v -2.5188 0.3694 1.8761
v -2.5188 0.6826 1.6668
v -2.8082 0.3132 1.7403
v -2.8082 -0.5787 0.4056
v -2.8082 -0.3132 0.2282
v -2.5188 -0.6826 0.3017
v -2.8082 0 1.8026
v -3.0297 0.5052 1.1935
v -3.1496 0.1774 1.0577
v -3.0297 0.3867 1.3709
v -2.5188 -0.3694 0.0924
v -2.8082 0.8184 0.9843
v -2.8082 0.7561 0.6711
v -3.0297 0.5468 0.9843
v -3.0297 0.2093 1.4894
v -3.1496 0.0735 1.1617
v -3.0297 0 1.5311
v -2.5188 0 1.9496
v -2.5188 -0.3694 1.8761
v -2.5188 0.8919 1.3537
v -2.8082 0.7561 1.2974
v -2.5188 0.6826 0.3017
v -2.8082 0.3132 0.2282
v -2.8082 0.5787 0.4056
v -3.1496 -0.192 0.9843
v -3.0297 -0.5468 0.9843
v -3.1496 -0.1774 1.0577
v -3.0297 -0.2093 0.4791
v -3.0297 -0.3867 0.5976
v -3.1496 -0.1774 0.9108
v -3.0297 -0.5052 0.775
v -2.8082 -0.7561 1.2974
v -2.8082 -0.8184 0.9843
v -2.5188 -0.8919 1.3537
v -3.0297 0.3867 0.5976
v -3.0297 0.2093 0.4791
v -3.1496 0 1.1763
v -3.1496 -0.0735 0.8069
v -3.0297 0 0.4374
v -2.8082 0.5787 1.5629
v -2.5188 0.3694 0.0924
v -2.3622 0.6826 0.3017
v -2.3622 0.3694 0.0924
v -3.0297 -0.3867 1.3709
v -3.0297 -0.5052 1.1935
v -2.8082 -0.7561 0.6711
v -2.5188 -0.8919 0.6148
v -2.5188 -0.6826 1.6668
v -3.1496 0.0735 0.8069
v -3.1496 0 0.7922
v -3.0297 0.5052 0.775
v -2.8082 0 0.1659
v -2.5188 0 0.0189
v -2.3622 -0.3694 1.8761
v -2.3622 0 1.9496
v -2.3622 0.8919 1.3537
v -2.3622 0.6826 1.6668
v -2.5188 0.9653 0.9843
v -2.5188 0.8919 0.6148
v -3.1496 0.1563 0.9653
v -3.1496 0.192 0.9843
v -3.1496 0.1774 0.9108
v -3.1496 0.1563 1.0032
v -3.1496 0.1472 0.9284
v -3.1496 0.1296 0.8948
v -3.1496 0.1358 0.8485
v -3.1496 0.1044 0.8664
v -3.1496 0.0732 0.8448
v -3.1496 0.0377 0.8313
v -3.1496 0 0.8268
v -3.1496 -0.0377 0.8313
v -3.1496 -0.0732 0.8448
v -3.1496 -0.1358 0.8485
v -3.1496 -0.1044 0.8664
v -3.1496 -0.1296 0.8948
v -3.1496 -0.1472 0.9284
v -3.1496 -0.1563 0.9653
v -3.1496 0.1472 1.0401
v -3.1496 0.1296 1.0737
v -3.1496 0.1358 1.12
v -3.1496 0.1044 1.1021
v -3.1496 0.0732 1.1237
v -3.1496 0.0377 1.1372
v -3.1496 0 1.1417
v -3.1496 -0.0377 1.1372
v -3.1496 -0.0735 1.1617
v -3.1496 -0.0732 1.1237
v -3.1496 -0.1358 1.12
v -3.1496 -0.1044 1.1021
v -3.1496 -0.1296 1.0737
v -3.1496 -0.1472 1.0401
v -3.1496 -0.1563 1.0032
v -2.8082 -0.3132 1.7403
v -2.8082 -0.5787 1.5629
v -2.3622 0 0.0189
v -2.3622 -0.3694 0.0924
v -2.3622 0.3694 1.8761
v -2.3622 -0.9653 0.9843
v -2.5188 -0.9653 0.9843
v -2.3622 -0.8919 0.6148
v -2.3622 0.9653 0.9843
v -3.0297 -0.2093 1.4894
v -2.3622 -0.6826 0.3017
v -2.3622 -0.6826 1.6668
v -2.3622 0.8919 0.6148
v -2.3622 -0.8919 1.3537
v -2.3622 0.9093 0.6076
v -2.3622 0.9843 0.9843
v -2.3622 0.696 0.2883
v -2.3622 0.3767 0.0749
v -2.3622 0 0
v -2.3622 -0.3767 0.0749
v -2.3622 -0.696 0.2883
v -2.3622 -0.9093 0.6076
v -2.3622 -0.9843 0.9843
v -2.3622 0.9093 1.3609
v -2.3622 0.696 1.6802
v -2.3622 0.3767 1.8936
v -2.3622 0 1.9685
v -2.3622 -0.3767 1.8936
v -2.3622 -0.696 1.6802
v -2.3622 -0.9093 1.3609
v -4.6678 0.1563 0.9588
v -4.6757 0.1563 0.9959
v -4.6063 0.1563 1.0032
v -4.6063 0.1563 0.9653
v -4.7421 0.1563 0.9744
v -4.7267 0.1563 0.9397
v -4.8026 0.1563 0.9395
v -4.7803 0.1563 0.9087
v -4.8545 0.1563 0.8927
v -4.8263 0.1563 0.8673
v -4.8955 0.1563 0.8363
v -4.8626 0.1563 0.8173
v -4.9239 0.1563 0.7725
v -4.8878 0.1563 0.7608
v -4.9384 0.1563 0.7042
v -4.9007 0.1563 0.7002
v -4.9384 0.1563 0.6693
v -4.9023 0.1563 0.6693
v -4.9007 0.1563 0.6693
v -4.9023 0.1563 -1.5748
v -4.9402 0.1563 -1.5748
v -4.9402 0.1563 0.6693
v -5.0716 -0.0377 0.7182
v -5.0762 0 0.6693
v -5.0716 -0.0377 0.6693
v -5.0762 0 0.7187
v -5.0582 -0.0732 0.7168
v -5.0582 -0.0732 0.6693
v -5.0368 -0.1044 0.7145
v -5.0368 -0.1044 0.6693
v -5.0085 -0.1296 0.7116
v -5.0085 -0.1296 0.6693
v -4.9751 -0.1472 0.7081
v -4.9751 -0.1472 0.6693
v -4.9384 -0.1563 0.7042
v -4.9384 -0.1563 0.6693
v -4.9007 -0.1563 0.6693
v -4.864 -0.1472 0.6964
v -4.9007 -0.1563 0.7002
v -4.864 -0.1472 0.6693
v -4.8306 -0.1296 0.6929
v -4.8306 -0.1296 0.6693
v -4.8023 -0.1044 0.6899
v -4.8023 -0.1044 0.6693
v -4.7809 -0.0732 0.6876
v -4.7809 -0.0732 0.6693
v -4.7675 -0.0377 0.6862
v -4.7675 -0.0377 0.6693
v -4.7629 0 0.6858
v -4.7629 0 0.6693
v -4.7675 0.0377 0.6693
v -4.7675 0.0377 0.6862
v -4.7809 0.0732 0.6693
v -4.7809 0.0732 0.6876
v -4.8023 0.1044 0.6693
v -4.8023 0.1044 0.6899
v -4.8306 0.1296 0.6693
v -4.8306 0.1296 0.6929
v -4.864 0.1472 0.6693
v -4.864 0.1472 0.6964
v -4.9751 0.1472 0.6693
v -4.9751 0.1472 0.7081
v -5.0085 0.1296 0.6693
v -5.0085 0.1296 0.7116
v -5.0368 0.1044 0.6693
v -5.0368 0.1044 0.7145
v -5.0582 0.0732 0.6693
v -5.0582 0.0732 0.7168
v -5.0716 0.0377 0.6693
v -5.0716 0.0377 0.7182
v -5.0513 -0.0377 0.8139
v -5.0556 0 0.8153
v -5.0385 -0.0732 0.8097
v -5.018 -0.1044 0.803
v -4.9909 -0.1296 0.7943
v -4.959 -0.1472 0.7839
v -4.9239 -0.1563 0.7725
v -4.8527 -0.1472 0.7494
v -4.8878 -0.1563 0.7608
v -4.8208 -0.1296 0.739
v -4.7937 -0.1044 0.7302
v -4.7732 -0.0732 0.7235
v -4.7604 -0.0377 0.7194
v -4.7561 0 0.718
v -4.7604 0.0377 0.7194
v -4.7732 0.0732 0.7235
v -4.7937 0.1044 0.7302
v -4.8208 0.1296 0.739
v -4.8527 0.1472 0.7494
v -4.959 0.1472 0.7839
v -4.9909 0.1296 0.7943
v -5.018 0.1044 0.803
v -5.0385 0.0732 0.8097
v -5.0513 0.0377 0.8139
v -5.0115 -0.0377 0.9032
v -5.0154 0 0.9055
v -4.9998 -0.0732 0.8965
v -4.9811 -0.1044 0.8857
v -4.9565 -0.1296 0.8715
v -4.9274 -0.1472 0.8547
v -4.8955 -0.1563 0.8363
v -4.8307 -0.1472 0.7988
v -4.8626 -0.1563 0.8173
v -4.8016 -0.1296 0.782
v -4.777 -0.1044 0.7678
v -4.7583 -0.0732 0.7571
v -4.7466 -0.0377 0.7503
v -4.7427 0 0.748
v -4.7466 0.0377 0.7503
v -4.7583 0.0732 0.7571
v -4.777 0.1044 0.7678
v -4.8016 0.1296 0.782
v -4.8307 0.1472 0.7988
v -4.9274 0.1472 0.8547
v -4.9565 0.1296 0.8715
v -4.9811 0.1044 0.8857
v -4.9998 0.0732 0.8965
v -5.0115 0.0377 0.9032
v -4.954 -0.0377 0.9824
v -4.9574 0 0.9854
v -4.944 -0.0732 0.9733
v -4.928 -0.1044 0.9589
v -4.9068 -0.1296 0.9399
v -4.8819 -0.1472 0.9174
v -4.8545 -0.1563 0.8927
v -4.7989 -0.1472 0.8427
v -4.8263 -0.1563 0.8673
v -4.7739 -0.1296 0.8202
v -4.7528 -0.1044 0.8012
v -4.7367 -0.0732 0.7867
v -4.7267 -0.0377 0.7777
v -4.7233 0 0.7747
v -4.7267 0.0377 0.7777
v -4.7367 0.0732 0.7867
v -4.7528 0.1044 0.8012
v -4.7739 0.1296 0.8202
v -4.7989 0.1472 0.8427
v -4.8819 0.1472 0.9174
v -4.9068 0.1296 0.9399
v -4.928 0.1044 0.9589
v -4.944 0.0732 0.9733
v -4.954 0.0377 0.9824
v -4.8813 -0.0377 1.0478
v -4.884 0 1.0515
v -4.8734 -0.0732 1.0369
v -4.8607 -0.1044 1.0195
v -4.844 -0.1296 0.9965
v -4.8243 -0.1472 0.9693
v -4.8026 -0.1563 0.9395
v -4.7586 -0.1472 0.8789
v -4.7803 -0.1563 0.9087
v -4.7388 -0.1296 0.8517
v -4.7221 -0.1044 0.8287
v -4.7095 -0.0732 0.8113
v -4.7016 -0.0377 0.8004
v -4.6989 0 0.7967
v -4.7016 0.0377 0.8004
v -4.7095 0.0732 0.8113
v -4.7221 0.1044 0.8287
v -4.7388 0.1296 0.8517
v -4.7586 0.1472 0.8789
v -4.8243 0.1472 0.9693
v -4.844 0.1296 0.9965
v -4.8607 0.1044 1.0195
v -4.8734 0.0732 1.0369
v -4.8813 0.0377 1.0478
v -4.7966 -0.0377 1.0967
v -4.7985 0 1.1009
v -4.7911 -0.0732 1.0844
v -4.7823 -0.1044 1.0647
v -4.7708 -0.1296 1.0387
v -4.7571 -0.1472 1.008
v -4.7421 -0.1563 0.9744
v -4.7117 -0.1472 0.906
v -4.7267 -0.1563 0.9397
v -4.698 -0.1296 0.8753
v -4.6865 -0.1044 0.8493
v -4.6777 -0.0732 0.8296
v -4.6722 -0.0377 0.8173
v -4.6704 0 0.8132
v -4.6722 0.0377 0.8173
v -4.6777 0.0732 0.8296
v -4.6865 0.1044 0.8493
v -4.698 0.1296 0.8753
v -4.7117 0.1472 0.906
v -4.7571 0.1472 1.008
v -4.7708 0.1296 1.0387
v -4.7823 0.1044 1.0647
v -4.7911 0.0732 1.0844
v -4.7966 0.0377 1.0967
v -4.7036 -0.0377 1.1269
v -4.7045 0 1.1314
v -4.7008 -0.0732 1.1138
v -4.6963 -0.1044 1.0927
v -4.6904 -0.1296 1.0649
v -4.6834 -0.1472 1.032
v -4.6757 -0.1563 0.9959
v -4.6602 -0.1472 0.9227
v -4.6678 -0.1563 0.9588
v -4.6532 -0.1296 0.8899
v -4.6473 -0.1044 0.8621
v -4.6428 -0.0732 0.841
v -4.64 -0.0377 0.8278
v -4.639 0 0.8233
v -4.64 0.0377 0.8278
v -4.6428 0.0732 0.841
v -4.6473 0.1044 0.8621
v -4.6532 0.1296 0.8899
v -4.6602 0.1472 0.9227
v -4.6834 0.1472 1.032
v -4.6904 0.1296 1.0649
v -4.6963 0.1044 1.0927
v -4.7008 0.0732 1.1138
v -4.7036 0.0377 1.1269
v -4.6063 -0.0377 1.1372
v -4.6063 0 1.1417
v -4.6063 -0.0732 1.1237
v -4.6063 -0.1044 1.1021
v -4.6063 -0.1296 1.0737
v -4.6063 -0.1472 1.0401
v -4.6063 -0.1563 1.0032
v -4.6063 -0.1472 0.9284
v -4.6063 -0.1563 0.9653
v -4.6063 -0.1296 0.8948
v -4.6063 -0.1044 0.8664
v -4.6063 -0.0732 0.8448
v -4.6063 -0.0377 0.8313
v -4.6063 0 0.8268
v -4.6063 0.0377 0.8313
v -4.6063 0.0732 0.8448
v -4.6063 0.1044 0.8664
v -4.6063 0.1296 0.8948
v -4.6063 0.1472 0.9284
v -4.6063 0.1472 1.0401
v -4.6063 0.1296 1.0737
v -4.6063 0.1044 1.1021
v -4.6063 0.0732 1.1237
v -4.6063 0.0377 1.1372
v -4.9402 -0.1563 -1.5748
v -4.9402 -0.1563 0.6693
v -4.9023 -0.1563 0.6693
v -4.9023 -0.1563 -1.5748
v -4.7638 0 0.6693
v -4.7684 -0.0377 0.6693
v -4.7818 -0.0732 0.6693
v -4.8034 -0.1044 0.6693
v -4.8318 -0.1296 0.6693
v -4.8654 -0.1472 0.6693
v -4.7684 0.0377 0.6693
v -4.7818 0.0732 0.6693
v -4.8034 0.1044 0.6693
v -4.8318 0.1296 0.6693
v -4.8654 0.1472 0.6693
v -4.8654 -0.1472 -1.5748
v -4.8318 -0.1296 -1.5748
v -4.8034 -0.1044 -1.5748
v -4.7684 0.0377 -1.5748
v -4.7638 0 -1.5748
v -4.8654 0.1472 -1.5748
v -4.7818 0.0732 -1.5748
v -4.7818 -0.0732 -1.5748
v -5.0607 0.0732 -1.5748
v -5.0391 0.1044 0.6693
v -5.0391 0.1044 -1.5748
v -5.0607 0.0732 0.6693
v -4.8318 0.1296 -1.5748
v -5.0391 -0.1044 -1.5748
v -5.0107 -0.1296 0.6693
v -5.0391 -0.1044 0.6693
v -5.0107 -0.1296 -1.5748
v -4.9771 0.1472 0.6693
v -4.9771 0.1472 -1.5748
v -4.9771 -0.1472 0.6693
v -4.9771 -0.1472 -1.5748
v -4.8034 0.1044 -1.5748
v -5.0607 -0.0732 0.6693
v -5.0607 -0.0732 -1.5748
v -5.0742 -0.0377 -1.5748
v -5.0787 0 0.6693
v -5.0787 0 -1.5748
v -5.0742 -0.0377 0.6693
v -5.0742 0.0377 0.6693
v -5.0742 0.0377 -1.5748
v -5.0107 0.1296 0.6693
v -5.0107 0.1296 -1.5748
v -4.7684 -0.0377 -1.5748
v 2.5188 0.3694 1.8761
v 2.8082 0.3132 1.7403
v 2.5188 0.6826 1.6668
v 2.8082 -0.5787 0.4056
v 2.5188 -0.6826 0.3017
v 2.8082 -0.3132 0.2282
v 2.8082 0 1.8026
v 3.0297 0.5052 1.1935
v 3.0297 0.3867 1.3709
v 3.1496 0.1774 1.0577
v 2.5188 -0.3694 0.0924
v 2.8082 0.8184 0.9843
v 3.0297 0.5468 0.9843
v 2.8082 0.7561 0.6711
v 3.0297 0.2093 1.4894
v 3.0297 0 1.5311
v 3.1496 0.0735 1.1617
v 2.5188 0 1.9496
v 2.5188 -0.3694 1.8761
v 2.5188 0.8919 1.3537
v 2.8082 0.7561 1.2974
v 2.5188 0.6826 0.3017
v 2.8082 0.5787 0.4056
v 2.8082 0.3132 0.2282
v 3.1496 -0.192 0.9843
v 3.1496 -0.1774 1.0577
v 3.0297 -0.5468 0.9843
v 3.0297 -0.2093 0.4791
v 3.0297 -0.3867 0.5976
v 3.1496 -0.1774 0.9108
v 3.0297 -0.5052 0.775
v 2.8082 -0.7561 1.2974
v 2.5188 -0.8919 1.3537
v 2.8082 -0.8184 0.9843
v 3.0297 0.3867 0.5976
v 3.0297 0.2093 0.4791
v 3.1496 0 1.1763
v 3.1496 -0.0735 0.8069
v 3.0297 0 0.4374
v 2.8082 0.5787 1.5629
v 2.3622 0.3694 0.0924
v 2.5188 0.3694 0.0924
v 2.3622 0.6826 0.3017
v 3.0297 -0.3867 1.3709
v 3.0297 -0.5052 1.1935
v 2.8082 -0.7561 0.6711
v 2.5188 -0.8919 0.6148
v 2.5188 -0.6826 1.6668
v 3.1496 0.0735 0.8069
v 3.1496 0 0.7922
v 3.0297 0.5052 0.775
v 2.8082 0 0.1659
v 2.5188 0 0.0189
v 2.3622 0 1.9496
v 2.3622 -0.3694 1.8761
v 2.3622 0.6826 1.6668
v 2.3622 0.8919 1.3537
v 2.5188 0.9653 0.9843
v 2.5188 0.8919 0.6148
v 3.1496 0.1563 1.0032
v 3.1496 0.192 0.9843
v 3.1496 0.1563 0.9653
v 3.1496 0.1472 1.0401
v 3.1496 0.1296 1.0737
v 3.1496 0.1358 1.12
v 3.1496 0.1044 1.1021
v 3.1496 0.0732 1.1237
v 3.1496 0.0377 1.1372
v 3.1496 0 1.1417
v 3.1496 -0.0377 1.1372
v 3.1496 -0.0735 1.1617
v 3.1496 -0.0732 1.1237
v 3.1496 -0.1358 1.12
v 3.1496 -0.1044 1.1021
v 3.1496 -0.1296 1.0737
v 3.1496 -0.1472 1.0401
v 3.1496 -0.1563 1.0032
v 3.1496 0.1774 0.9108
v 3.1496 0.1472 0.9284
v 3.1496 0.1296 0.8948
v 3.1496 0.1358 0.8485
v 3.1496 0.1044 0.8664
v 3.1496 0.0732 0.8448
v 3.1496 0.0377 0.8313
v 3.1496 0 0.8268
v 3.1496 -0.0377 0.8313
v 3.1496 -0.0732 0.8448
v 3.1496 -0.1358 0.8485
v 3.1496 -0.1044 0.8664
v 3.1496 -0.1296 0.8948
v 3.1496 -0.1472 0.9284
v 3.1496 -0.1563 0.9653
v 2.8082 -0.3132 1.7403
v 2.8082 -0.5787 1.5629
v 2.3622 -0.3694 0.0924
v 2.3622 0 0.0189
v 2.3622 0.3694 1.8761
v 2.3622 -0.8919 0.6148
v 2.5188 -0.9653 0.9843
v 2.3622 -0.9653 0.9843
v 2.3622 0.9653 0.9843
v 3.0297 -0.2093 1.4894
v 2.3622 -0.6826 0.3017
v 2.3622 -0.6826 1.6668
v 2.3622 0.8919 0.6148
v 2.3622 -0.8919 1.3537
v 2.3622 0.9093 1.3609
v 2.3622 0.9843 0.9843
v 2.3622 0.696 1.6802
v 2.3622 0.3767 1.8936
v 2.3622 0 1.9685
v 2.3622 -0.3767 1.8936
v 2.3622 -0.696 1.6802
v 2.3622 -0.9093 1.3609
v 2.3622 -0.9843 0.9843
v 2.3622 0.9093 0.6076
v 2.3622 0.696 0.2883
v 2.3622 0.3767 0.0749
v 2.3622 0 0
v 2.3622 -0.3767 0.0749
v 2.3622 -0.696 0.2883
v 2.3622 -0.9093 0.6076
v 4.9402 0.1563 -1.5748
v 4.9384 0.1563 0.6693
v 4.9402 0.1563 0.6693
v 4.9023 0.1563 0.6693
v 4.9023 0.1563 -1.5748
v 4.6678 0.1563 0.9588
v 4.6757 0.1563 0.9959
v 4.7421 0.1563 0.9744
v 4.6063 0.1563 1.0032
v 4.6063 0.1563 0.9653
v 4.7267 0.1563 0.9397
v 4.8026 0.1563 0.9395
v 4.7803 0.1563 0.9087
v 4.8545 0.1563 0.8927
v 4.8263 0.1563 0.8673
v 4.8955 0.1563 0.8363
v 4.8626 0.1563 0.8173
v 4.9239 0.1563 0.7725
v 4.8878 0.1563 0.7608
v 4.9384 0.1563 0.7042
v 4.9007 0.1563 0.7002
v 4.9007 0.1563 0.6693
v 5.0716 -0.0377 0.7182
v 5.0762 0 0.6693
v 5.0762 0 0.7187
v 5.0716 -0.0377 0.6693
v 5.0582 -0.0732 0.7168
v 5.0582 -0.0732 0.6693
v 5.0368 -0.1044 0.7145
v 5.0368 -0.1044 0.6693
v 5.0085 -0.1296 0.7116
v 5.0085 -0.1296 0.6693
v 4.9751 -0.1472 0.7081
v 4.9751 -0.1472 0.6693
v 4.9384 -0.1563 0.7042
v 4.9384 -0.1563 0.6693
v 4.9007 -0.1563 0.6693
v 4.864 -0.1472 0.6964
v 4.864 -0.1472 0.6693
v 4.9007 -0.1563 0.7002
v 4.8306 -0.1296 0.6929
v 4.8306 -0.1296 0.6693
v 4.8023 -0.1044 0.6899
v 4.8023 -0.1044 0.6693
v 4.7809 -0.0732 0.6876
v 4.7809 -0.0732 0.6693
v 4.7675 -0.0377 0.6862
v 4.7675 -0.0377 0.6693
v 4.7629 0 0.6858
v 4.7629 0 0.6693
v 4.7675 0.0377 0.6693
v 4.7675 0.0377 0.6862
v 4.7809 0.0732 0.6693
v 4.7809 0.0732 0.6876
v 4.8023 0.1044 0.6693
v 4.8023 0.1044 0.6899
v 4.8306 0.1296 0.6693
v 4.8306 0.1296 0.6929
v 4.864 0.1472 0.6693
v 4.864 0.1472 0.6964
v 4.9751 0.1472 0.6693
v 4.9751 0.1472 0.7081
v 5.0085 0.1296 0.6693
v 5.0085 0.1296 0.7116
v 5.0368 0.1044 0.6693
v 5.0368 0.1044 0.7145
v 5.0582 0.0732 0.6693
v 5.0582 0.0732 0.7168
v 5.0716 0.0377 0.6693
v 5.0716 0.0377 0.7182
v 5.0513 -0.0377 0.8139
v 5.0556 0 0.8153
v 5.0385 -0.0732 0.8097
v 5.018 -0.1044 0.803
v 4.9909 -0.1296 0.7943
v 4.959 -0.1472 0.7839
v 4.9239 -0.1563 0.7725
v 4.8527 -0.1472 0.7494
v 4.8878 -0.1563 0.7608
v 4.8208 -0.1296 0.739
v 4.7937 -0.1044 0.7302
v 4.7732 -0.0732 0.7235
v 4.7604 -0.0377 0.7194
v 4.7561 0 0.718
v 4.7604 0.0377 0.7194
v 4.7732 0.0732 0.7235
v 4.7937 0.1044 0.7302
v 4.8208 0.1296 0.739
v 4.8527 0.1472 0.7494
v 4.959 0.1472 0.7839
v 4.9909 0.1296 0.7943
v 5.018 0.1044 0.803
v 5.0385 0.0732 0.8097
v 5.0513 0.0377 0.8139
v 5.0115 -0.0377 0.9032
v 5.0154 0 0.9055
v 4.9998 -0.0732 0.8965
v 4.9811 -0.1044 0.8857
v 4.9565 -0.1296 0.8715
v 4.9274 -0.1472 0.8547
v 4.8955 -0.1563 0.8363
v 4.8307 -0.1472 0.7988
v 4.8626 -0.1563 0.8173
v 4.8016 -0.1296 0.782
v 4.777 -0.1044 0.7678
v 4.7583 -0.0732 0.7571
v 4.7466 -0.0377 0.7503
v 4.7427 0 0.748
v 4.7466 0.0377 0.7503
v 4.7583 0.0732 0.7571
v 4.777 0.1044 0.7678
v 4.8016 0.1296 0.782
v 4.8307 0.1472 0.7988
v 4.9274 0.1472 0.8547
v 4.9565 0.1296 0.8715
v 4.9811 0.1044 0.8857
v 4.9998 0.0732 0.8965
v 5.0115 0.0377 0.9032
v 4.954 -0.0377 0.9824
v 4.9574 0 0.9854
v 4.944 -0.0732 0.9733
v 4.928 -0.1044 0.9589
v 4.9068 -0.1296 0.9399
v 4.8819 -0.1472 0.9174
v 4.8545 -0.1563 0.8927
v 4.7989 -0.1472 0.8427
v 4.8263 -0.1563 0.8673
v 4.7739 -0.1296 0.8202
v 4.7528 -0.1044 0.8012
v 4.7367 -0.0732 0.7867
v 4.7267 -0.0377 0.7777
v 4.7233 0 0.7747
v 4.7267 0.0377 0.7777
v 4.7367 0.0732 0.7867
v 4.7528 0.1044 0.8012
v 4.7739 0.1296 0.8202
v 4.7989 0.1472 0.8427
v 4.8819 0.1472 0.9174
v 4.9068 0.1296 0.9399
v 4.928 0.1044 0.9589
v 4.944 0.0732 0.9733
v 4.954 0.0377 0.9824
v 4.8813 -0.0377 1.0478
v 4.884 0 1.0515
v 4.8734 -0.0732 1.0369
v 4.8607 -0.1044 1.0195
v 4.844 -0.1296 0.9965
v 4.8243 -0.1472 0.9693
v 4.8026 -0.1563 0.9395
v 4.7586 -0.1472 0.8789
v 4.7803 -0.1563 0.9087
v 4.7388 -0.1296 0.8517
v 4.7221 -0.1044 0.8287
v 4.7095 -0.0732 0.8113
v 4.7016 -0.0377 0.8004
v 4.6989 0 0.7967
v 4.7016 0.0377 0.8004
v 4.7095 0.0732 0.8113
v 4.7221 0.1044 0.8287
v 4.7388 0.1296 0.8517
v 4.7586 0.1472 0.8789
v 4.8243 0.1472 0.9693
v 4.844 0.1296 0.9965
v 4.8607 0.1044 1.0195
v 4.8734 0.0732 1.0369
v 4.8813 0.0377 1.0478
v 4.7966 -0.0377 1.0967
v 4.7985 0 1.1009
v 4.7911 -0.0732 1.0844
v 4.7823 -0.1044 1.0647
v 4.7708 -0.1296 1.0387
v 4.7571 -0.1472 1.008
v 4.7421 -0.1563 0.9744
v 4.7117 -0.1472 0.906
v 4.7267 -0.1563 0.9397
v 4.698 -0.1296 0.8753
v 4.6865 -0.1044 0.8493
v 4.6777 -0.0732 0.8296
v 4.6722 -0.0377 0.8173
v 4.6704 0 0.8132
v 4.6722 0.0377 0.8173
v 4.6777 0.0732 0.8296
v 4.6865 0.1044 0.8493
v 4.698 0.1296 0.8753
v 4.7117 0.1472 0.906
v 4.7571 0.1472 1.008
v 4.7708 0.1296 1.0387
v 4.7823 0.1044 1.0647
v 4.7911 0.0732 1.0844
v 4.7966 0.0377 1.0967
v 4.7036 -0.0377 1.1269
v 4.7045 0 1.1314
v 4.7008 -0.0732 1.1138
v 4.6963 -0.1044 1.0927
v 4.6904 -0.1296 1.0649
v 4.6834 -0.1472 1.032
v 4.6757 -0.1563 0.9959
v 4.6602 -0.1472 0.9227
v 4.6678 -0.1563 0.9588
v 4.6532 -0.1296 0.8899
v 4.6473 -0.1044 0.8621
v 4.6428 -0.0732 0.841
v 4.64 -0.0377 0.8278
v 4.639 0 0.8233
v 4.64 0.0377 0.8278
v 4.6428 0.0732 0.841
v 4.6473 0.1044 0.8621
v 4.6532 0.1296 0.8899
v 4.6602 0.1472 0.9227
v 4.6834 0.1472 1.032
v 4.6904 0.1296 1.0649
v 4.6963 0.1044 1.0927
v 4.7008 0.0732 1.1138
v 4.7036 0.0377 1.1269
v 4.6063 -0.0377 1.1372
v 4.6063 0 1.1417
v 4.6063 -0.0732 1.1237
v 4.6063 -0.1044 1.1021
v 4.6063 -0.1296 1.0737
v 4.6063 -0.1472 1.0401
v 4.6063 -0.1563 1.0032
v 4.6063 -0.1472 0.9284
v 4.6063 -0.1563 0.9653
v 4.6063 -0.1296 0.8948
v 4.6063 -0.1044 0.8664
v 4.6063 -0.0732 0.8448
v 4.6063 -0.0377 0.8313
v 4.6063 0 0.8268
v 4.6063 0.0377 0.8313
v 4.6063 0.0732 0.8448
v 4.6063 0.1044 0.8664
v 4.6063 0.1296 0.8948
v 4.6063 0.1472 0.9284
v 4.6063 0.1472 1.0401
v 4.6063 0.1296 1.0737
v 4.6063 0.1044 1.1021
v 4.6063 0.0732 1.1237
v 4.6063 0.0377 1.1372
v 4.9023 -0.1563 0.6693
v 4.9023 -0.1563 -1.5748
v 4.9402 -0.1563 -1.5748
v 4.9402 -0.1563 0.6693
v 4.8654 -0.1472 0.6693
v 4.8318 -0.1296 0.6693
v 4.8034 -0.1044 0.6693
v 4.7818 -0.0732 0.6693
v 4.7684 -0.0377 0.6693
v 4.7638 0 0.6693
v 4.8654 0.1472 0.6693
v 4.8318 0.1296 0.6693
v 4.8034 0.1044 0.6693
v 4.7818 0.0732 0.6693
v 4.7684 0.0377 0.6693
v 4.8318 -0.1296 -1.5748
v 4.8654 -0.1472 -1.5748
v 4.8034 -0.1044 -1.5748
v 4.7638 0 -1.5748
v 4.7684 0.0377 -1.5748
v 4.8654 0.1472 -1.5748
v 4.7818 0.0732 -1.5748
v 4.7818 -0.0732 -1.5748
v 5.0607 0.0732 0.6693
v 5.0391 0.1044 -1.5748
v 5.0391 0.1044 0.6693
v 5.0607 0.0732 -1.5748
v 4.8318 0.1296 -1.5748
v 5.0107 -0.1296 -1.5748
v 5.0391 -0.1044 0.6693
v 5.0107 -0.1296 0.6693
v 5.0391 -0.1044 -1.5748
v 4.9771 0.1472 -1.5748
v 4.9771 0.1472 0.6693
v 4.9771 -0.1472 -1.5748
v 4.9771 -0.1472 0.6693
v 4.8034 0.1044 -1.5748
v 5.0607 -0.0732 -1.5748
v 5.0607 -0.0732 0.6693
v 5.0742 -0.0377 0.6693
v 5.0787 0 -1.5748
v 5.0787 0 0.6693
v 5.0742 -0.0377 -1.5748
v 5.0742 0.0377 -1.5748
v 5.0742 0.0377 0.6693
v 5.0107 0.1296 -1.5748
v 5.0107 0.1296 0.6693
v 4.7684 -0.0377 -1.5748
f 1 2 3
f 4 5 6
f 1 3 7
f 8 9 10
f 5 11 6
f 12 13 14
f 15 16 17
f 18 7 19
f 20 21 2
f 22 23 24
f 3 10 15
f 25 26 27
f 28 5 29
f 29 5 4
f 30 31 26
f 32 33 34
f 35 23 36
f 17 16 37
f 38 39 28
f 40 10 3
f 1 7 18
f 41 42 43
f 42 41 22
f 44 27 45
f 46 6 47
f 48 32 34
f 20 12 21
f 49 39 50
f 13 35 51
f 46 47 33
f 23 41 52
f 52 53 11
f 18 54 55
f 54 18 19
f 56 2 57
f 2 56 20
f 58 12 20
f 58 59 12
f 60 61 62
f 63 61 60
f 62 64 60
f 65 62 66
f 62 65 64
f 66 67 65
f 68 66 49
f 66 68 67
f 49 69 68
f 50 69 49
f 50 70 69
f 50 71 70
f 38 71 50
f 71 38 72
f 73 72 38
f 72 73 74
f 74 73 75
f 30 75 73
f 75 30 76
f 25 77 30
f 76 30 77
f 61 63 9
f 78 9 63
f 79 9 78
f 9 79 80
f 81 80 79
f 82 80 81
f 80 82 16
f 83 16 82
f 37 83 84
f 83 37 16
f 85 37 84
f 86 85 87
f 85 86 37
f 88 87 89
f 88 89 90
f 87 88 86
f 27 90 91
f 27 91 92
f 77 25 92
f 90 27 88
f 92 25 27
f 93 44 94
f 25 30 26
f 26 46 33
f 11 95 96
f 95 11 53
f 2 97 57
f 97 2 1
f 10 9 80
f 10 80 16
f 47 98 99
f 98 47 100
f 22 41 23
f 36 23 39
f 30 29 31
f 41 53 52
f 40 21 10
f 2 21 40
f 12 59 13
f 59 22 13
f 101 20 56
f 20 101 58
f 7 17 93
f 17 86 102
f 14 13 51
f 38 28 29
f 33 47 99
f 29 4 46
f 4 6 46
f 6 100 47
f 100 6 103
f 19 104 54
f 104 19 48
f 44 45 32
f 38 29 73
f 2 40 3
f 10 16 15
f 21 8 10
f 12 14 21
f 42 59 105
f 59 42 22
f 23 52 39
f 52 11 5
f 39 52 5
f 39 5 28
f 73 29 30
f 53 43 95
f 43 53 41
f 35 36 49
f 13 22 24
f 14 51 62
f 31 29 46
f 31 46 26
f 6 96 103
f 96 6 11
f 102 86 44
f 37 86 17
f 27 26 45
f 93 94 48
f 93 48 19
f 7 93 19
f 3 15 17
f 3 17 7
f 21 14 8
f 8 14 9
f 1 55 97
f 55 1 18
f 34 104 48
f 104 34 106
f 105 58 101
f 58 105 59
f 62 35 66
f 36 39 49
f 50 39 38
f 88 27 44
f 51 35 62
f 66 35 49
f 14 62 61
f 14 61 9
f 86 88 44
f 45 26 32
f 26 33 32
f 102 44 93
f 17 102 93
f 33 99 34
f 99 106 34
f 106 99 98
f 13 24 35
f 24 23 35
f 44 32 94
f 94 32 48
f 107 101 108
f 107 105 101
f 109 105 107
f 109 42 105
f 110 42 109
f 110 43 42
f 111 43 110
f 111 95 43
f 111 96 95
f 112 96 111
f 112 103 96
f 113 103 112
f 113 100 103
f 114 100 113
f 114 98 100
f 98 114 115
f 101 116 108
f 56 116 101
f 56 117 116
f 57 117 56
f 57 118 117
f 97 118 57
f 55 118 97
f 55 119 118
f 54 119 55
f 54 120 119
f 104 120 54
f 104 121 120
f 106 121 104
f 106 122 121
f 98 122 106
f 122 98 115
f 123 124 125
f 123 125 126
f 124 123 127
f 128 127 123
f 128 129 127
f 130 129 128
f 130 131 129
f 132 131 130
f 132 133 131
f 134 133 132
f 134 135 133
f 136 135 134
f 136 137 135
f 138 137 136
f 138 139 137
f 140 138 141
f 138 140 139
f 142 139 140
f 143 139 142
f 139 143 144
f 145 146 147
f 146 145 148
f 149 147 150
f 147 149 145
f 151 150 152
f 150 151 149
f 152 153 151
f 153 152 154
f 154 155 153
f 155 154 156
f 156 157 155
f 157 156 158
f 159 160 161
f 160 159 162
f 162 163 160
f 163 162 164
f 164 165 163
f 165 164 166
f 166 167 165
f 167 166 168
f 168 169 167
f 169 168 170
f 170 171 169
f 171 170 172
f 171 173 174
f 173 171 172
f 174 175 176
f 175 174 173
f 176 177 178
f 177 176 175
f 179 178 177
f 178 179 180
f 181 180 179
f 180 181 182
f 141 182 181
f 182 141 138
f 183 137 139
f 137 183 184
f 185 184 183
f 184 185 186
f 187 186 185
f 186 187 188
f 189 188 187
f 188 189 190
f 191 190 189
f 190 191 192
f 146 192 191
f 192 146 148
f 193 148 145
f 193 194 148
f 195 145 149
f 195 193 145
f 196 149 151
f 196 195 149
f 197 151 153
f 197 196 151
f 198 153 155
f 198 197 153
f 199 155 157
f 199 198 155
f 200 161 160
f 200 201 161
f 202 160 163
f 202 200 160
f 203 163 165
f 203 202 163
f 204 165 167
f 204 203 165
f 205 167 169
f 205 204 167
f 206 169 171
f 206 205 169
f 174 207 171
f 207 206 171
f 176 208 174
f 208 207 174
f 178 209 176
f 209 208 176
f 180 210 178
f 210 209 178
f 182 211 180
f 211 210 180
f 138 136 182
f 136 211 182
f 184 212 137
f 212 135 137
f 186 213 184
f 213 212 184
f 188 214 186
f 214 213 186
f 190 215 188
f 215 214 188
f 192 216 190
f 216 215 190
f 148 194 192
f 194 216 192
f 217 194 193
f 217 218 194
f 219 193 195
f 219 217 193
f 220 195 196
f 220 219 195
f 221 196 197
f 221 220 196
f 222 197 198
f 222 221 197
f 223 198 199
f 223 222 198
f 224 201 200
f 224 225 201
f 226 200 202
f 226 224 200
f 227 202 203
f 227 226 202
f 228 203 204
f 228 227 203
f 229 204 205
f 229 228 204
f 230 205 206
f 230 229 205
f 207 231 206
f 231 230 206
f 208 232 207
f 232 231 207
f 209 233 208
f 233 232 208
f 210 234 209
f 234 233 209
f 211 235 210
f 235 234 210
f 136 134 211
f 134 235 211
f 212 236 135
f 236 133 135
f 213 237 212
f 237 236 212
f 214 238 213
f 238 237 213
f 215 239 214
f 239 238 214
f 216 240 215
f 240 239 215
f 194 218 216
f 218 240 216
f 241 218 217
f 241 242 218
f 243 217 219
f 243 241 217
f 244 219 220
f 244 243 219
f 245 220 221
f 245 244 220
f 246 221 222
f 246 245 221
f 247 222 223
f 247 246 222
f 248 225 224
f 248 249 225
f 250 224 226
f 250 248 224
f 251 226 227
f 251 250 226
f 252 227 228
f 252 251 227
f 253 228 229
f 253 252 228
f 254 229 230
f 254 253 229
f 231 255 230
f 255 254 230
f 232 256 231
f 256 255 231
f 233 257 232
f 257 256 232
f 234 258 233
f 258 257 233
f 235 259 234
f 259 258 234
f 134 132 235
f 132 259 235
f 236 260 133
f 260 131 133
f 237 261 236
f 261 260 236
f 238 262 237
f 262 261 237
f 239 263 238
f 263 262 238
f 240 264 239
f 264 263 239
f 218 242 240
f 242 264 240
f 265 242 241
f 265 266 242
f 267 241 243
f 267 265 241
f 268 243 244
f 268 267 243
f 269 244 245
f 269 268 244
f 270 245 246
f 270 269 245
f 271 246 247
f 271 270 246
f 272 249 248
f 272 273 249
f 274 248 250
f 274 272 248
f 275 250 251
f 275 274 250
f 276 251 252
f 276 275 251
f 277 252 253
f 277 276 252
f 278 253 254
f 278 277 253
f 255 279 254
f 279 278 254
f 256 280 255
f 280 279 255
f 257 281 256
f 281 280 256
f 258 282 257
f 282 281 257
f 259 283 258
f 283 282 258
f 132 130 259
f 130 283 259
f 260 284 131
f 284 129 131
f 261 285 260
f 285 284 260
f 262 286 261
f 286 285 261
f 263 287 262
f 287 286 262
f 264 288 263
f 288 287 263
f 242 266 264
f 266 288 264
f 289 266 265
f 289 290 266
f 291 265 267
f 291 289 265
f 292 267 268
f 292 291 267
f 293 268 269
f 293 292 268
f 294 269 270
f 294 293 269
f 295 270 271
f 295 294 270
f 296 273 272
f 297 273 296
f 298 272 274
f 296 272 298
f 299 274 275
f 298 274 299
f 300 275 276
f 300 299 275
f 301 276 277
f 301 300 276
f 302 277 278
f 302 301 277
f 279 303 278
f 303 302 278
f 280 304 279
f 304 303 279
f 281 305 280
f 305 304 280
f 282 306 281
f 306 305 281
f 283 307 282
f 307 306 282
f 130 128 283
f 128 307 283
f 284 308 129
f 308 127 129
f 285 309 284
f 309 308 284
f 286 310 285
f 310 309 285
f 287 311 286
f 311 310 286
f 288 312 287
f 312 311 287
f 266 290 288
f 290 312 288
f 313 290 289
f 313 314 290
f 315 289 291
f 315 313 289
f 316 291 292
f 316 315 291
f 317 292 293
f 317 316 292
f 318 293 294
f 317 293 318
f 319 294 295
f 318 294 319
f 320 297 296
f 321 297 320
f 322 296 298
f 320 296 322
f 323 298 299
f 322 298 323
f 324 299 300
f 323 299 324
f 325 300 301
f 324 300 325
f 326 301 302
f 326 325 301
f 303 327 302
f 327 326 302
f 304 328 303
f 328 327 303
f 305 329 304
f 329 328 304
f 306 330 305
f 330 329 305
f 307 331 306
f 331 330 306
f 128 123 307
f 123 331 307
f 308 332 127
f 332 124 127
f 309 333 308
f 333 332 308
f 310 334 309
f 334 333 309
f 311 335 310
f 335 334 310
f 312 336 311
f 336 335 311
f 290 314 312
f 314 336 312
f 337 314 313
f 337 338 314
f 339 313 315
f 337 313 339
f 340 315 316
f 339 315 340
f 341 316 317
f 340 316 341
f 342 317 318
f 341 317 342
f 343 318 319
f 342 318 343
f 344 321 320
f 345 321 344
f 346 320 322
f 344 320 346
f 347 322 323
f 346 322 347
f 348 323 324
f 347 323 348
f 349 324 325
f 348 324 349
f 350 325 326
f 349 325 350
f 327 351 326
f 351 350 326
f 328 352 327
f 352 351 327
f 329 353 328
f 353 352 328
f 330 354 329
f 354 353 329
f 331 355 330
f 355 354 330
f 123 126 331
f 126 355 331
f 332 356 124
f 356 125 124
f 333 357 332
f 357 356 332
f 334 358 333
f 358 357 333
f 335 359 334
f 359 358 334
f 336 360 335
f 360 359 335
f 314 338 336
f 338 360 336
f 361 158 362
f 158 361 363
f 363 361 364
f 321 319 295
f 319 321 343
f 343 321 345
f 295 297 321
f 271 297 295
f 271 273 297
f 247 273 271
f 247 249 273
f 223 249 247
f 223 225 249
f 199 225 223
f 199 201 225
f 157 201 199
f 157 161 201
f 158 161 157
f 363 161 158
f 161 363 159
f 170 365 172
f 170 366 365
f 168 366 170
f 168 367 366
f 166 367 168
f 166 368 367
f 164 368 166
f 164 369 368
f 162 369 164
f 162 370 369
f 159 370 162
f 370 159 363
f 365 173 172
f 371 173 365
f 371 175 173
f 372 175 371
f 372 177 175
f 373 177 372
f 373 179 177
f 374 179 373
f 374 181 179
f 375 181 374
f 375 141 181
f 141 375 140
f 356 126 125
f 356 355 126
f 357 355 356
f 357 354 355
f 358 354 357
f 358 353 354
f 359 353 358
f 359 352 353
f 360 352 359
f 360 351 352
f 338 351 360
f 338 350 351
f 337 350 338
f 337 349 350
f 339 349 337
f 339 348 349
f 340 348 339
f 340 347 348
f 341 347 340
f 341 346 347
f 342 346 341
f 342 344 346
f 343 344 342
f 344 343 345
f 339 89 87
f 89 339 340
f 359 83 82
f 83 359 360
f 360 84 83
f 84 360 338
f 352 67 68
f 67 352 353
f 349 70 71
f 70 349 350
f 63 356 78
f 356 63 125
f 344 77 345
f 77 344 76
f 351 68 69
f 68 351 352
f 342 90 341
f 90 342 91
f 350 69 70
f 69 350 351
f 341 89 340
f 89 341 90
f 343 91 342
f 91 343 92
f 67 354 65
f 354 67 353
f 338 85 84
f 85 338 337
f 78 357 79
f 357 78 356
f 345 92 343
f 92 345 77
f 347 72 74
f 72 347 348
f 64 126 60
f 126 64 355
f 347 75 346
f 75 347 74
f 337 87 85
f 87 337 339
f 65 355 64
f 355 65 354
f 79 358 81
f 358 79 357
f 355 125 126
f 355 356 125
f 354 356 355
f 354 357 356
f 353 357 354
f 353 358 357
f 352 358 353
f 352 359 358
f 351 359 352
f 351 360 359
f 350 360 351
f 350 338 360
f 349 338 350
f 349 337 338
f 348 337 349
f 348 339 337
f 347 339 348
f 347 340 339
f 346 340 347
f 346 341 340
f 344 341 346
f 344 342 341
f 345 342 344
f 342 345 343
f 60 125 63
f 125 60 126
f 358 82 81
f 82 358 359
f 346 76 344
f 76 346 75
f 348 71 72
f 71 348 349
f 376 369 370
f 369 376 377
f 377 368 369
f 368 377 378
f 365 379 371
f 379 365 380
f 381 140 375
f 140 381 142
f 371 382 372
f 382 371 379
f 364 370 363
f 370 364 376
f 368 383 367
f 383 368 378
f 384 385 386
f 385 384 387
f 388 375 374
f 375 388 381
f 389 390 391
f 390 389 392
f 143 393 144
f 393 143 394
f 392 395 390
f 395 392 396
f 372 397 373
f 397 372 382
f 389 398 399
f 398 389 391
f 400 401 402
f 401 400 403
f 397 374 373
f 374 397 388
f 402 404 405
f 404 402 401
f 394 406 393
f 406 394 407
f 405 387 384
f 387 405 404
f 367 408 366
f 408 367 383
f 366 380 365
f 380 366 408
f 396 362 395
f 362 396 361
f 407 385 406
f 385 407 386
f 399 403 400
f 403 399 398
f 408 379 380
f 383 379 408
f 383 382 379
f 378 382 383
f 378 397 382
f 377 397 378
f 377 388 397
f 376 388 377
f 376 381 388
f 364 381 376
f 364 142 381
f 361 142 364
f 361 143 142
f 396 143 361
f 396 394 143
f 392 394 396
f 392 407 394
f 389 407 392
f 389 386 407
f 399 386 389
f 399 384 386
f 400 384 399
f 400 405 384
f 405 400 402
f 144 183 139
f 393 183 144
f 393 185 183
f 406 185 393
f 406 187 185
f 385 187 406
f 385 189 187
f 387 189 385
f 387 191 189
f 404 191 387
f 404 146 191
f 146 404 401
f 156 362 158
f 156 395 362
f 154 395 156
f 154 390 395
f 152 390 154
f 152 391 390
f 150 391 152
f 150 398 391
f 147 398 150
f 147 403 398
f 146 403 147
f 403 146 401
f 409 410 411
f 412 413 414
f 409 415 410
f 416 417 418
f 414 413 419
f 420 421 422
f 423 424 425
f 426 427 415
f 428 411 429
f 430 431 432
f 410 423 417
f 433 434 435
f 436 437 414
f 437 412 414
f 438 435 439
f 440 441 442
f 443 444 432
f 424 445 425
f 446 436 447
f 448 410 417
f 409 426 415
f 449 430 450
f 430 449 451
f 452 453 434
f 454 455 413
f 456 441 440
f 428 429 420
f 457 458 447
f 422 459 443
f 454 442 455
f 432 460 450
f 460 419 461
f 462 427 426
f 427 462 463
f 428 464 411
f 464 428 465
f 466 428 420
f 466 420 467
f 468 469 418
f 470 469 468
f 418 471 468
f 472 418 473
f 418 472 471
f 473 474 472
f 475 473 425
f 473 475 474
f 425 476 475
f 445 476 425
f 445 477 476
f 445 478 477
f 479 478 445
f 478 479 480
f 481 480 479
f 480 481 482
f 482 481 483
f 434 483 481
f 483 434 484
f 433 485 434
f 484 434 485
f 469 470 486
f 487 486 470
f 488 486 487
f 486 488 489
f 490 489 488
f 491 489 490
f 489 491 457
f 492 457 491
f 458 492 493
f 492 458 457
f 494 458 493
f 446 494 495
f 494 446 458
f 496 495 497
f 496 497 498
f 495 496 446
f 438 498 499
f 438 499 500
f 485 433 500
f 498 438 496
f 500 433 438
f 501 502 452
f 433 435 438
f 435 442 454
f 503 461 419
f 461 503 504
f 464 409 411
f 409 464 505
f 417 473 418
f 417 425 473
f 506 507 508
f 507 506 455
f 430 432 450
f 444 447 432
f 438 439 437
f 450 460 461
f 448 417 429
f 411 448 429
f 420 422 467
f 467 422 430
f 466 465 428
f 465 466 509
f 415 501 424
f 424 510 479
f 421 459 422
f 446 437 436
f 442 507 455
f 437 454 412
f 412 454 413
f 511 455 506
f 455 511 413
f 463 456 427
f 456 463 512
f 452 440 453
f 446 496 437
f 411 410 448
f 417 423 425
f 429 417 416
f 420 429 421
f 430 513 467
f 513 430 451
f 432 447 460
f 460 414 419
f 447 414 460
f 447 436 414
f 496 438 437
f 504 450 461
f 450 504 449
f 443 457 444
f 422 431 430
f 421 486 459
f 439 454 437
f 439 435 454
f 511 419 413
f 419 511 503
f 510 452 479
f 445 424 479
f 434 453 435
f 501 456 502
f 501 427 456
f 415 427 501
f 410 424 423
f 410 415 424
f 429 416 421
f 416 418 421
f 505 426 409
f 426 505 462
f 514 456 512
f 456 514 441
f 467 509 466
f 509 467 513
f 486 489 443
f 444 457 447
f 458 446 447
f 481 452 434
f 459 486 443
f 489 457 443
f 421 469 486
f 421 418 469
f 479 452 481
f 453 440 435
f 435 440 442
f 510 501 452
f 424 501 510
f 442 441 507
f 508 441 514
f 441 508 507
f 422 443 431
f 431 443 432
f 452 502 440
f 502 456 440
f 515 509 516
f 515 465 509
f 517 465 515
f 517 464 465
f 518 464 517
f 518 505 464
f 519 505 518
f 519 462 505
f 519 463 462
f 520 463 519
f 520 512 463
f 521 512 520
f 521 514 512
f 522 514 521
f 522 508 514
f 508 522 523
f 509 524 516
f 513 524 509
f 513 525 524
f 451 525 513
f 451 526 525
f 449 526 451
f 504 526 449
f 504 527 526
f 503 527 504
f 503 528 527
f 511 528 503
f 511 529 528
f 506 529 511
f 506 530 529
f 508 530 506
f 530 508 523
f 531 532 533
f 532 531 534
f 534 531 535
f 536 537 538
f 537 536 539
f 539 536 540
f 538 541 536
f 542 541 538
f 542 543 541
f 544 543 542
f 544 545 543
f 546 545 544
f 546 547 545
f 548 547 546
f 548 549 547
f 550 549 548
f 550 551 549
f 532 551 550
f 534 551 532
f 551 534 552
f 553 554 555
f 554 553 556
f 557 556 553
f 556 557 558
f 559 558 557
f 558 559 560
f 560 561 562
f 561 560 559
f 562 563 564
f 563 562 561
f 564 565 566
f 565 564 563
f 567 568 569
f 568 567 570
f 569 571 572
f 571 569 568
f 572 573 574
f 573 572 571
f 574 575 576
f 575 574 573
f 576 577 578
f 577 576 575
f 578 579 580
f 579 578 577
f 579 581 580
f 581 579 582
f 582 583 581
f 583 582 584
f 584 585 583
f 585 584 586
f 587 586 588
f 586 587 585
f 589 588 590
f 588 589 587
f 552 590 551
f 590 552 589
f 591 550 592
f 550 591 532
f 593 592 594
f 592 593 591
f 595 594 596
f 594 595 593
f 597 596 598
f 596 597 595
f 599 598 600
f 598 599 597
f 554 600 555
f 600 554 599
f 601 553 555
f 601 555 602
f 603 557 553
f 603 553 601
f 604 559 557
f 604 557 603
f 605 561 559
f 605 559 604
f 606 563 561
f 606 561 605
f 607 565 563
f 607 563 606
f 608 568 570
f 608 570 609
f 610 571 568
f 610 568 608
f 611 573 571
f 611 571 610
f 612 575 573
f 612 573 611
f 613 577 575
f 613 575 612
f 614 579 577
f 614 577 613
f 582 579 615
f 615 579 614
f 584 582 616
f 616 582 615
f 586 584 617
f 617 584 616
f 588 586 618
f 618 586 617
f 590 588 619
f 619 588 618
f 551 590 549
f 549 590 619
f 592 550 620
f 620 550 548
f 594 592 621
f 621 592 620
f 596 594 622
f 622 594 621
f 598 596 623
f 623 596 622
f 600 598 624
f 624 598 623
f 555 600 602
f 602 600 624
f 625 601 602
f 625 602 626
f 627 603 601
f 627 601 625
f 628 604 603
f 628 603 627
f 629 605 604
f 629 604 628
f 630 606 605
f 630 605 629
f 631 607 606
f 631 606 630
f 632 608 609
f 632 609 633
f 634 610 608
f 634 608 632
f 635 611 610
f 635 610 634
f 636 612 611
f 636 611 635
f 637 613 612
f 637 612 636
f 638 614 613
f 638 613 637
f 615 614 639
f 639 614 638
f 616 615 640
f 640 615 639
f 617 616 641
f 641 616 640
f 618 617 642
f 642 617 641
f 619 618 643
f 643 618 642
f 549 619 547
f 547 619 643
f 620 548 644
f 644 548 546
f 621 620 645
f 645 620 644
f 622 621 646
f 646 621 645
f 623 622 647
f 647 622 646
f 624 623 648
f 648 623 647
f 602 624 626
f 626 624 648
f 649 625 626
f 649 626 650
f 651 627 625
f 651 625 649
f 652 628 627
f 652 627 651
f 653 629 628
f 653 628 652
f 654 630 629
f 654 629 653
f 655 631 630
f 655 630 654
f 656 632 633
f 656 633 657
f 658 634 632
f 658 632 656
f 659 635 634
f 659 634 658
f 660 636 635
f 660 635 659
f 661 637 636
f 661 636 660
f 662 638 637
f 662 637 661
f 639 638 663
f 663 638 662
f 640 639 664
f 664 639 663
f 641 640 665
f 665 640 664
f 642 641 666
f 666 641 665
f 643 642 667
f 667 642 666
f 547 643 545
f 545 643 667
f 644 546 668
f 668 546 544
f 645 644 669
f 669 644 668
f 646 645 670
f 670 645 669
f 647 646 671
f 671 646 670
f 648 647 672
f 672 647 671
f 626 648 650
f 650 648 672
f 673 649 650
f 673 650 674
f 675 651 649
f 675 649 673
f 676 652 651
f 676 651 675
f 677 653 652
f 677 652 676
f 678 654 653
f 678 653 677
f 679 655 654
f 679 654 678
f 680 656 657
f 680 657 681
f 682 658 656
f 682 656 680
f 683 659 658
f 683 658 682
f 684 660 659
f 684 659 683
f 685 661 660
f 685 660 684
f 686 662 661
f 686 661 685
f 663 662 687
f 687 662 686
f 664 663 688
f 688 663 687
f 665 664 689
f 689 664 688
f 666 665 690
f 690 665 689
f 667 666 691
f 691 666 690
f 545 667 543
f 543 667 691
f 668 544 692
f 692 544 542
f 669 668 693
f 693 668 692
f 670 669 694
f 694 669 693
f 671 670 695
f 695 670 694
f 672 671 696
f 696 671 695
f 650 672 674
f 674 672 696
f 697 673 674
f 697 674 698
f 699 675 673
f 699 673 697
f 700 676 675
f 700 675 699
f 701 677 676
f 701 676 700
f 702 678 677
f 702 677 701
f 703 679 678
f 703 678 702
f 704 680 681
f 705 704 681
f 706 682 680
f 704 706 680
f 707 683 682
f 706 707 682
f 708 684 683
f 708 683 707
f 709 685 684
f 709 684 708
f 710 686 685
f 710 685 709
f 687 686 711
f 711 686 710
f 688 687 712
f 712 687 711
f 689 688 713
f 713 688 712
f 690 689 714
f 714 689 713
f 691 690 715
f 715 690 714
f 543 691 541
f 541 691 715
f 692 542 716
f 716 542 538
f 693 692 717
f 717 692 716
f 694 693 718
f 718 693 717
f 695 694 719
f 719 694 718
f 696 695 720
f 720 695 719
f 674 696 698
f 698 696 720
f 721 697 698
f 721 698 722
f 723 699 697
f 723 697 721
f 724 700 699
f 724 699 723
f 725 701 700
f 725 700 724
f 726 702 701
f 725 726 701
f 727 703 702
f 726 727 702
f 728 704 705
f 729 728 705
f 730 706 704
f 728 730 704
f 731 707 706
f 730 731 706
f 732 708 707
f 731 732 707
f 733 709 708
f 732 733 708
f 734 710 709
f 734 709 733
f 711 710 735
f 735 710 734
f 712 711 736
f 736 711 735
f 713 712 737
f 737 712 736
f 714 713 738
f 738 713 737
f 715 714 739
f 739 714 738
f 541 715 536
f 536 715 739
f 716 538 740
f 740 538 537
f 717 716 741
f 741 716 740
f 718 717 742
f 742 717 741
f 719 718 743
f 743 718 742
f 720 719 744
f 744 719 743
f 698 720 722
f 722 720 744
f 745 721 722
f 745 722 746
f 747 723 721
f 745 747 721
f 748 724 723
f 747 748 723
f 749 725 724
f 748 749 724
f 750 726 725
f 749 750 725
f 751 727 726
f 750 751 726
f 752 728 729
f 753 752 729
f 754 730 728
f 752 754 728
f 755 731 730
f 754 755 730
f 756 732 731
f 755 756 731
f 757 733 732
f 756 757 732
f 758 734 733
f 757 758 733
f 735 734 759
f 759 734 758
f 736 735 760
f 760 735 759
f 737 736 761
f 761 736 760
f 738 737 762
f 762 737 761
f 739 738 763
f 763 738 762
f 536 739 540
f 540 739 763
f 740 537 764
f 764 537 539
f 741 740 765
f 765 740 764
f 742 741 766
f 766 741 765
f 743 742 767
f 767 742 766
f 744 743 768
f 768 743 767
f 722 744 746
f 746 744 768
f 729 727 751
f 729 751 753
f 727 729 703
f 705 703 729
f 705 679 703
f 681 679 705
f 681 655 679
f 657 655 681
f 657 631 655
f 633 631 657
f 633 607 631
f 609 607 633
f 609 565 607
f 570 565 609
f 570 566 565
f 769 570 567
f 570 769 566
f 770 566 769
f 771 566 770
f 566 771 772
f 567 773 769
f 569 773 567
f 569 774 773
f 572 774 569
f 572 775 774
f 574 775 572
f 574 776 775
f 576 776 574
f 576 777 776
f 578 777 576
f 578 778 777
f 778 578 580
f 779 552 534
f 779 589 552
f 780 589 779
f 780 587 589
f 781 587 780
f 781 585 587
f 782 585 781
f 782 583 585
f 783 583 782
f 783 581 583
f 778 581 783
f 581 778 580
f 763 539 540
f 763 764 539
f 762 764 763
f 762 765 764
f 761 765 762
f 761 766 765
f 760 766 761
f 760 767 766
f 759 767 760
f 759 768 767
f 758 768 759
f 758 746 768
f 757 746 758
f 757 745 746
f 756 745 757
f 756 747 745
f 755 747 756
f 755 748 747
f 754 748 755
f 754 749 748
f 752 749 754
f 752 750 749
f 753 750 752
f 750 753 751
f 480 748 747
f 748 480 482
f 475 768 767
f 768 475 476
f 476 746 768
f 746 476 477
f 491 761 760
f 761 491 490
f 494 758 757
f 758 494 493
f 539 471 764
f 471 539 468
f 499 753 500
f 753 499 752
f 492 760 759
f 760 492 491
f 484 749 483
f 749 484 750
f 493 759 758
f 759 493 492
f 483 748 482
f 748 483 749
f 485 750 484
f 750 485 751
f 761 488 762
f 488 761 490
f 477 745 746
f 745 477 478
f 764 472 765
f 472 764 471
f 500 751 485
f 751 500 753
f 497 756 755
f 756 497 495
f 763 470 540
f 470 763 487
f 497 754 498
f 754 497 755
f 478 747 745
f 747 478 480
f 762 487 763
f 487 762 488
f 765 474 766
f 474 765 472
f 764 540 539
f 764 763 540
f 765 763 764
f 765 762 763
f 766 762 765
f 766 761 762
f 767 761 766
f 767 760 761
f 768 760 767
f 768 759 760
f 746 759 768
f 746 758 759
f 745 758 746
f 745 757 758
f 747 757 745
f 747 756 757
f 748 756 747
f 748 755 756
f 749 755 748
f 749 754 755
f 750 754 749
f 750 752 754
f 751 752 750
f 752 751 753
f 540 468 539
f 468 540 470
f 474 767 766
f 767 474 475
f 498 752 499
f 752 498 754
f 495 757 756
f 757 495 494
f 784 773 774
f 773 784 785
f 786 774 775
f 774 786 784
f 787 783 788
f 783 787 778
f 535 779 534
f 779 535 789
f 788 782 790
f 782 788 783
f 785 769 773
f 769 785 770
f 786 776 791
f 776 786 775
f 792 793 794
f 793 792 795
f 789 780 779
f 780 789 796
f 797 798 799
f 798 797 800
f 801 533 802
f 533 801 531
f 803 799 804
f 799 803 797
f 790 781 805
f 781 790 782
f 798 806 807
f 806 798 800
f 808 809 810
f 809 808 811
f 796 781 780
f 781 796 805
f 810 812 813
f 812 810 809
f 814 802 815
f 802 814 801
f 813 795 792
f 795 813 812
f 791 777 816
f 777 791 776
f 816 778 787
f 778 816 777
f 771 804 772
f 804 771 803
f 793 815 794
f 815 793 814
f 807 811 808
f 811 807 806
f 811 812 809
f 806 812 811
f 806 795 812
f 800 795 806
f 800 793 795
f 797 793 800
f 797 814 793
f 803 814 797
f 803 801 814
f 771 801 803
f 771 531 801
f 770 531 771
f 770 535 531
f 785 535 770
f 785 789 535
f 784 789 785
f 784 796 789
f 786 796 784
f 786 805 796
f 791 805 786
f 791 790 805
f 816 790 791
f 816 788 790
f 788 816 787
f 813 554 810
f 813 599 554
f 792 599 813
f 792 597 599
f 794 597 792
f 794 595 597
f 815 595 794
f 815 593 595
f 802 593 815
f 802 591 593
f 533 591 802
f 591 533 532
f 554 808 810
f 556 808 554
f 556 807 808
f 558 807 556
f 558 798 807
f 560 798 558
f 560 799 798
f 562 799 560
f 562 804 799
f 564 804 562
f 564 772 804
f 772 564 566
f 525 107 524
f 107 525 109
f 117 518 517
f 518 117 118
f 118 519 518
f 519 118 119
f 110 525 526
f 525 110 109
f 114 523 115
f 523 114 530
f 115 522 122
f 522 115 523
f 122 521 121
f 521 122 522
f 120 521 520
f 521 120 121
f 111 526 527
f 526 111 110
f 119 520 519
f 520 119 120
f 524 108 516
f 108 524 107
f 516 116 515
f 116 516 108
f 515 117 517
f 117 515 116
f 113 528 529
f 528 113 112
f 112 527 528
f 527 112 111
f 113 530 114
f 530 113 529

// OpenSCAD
$fs = 1;

underground = 2;
herm_l = 2;

module pin(d, l, h) {
	$fs = 0.1;
	r = d;

	color([0.75, 0.75, 0.75])
	union() {
		cylinder(h = l-r, d = d);
	
		translate([-h - underground, 0, l])
		rotate(a = 90, v = [0, 1, 0])
		cylinder(h = h + underground-r, d = d);
	
		translate([-d, 0, l - r])
		rotate([90, 0, 0])
		intersection() {
			rotate_extrude()
			translate([r, 0, 0])
			circle(d = d);
	
			translate([0, 0, -d])
			cube(d*2);
		}
	}
}

module herm(d) {
	color([0.4, 0.9, 0.45])
	difference() {
		resize([0, 0, herm_l*2])
		sphere(d = d, center = true);

		translate([-d/2, -d/2, -d])
		cube(d);
	}
}

module c_herm(d, l, step) {
	translate([(l - herm_l*2)/2, 0, d/2])
	rotate([0, -90, 0]) {
		color("silver")
		cylinder(h = l - herm_l*2, d = d);
	
		translate([0, 0, l - herm_l*2]) {
			herm(d);
			translate([0, 0, herm_l])
			pin(0.8, (step - l)/2, d/2+underground);
		}
	
		mirror([0, 0, 1]) {
			herm(d);
			translate([0, 0, herm_l])
			pin(0.8, (step - l)/2, d/2+underground);
		}
	}
}

_inch = 1/2.54;
scale([_inch, _inch, _inch]) {
	c_herm(5, 16, 25);
	//c_herm(5, 17, 25);
	//c_herm(6.5, 17, 25);
	//c_herm(6.5, 19, 27);
	//c_herm(7.5, 22, 30);
	//c_herm(8.5, 19.5, 26);
	//c_herm(8.5, 33, 40);
	//c_herm(11, 33, 40);
}
